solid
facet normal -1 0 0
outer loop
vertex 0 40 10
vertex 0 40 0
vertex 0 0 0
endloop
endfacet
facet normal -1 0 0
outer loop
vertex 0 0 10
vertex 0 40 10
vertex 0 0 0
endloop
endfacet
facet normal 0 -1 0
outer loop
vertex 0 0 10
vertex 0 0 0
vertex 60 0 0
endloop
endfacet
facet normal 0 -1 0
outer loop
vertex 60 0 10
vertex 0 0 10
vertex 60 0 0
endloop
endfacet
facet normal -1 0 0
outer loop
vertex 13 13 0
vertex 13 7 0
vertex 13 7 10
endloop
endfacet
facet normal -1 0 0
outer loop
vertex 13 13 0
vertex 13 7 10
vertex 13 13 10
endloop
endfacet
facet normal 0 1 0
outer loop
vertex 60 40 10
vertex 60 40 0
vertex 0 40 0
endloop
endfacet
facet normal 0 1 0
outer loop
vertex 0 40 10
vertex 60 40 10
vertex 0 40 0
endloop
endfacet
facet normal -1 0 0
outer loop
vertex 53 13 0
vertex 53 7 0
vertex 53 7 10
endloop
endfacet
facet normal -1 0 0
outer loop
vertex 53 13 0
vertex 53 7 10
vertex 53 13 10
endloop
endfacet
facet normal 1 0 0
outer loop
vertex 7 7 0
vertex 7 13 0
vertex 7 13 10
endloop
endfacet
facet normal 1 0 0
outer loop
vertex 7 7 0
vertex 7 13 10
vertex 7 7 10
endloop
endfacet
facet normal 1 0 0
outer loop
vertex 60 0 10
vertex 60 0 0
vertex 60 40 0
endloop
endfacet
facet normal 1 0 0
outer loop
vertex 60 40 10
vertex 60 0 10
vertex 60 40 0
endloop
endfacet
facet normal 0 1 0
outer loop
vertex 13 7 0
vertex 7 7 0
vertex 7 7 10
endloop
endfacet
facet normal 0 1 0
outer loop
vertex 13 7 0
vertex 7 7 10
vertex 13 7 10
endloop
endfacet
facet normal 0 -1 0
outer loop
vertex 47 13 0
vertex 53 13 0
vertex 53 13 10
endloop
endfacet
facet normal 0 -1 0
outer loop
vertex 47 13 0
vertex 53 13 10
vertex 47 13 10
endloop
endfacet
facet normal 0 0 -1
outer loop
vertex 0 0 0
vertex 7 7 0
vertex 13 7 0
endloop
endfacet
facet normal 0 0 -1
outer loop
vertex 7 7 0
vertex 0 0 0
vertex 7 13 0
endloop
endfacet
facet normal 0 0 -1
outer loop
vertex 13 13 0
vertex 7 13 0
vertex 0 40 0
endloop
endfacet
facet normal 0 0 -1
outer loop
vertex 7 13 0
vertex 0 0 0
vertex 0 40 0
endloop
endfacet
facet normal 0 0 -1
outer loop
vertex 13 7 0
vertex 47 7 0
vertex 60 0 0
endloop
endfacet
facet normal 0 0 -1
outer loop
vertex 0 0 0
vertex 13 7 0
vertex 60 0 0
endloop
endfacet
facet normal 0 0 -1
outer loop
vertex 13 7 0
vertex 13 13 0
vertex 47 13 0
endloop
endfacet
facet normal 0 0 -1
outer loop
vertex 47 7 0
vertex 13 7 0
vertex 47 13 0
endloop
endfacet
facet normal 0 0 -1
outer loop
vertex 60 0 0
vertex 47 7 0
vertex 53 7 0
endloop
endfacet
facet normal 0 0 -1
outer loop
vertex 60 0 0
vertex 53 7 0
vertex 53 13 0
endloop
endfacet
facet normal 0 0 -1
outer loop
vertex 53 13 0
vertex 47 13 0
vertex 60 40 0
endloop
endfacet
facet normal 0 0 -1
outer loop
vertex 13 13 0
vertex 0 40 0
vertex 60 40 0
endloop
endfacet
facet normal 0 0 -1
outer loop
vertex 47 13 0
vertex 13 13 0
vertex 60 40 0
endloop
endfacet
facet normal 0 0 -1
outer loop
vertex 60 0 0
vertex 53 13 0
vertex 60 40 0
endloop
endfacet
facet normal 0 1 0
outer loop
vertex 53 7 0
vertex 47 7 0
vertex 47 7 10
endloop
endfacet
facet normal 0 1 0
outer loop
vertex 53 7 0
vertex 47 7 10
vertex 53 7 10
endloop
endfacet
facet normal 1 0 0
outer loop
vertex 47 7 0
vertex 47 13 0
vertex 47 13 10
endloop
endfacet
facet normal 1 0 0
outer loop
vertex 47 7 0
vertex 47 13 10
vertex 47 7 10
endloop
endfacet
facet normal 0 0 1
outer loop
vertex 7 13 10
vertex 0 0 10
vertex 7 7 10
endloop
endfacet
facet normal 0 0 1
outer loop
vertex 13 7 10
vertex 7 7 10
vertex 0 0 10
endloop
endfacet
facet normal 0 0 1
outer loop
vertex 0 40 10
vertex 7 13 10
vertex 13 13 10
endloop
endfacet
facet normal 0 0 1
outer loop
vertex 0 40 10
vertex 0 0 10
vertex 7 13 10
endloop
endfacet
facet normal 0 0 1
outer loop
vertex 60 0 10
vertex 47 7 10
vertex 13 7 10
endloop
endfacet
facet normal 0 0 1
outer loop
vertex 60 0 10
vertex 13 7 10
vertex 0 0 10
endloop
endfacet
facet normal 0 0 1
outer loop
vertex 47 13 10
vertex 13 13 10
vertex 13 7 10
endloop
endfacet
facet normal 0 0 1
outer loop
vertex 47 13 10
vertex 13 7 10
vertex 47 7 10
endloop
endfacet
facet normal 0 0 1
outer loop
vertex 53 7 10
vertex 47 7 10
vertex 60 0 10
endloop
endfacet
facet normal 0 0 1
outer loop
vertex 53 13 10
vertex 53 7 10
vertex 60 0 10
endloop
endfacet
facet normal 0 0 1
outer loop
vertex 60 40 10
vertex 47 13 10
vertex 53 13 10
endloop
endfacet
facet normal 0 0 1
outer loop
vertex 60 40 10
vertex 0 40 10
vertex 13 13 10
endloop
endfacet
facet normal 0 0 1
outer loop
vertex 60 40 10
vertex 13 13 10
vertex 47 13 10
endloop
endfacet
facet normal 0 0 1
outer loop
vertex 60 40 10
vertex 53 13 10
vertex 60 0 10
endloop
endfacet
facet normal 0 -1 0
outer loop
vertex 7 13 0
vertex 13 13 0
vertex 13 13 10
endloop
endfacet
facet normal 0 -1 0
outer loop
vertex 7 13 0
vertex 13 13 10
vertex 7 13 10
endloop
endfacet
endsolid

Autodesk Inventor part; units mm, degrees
ref_plane "XZ Plane" through (0, 0, 0) normal (0, 1, 0) x (-1, 0, 0)
ref_plane "XY Plane" through (0, 0, 0) normal (0, 0, 1) x (1, 0, 0)
sketch "Sketch1" plane through (0, 0, 0) normal (0, 0, 1) x (1, 0, 0)
  line L0 (0, 0) -> (60, 0)
  line L1 (60, 0) -> (60, 40)
  line L2 (60, 40) -> (0, 40)
  line L3 (0, 40) -> (0, 0)
extrude "Extrusion1" add sketch "Sketch1" along normal blind 10
sketch "Sketch2" plane through (0, 0, 0) normal (0, 0, 1) x (1, 0, 0)
  line L0 (7, 7) -> (13, 7)
  line L1 (13, 7) -> (13, 13)
  line L2 (13, 13) -> (7, 13)
  line L3 (7, 13) -> (7, 7)
extrude "Extrusion2" cut sketch "Sketch2" along normal blind 10
ref_plane "Work Plane1" through (30, 0, 0) normal (1, 0, 0) x (0, 1, 0)
mirror "Mirror1" about plane through (30, 0, 0) normal (1, 0, 0) of "Extrusion2"
properties part number "23_pocket_mirror"
